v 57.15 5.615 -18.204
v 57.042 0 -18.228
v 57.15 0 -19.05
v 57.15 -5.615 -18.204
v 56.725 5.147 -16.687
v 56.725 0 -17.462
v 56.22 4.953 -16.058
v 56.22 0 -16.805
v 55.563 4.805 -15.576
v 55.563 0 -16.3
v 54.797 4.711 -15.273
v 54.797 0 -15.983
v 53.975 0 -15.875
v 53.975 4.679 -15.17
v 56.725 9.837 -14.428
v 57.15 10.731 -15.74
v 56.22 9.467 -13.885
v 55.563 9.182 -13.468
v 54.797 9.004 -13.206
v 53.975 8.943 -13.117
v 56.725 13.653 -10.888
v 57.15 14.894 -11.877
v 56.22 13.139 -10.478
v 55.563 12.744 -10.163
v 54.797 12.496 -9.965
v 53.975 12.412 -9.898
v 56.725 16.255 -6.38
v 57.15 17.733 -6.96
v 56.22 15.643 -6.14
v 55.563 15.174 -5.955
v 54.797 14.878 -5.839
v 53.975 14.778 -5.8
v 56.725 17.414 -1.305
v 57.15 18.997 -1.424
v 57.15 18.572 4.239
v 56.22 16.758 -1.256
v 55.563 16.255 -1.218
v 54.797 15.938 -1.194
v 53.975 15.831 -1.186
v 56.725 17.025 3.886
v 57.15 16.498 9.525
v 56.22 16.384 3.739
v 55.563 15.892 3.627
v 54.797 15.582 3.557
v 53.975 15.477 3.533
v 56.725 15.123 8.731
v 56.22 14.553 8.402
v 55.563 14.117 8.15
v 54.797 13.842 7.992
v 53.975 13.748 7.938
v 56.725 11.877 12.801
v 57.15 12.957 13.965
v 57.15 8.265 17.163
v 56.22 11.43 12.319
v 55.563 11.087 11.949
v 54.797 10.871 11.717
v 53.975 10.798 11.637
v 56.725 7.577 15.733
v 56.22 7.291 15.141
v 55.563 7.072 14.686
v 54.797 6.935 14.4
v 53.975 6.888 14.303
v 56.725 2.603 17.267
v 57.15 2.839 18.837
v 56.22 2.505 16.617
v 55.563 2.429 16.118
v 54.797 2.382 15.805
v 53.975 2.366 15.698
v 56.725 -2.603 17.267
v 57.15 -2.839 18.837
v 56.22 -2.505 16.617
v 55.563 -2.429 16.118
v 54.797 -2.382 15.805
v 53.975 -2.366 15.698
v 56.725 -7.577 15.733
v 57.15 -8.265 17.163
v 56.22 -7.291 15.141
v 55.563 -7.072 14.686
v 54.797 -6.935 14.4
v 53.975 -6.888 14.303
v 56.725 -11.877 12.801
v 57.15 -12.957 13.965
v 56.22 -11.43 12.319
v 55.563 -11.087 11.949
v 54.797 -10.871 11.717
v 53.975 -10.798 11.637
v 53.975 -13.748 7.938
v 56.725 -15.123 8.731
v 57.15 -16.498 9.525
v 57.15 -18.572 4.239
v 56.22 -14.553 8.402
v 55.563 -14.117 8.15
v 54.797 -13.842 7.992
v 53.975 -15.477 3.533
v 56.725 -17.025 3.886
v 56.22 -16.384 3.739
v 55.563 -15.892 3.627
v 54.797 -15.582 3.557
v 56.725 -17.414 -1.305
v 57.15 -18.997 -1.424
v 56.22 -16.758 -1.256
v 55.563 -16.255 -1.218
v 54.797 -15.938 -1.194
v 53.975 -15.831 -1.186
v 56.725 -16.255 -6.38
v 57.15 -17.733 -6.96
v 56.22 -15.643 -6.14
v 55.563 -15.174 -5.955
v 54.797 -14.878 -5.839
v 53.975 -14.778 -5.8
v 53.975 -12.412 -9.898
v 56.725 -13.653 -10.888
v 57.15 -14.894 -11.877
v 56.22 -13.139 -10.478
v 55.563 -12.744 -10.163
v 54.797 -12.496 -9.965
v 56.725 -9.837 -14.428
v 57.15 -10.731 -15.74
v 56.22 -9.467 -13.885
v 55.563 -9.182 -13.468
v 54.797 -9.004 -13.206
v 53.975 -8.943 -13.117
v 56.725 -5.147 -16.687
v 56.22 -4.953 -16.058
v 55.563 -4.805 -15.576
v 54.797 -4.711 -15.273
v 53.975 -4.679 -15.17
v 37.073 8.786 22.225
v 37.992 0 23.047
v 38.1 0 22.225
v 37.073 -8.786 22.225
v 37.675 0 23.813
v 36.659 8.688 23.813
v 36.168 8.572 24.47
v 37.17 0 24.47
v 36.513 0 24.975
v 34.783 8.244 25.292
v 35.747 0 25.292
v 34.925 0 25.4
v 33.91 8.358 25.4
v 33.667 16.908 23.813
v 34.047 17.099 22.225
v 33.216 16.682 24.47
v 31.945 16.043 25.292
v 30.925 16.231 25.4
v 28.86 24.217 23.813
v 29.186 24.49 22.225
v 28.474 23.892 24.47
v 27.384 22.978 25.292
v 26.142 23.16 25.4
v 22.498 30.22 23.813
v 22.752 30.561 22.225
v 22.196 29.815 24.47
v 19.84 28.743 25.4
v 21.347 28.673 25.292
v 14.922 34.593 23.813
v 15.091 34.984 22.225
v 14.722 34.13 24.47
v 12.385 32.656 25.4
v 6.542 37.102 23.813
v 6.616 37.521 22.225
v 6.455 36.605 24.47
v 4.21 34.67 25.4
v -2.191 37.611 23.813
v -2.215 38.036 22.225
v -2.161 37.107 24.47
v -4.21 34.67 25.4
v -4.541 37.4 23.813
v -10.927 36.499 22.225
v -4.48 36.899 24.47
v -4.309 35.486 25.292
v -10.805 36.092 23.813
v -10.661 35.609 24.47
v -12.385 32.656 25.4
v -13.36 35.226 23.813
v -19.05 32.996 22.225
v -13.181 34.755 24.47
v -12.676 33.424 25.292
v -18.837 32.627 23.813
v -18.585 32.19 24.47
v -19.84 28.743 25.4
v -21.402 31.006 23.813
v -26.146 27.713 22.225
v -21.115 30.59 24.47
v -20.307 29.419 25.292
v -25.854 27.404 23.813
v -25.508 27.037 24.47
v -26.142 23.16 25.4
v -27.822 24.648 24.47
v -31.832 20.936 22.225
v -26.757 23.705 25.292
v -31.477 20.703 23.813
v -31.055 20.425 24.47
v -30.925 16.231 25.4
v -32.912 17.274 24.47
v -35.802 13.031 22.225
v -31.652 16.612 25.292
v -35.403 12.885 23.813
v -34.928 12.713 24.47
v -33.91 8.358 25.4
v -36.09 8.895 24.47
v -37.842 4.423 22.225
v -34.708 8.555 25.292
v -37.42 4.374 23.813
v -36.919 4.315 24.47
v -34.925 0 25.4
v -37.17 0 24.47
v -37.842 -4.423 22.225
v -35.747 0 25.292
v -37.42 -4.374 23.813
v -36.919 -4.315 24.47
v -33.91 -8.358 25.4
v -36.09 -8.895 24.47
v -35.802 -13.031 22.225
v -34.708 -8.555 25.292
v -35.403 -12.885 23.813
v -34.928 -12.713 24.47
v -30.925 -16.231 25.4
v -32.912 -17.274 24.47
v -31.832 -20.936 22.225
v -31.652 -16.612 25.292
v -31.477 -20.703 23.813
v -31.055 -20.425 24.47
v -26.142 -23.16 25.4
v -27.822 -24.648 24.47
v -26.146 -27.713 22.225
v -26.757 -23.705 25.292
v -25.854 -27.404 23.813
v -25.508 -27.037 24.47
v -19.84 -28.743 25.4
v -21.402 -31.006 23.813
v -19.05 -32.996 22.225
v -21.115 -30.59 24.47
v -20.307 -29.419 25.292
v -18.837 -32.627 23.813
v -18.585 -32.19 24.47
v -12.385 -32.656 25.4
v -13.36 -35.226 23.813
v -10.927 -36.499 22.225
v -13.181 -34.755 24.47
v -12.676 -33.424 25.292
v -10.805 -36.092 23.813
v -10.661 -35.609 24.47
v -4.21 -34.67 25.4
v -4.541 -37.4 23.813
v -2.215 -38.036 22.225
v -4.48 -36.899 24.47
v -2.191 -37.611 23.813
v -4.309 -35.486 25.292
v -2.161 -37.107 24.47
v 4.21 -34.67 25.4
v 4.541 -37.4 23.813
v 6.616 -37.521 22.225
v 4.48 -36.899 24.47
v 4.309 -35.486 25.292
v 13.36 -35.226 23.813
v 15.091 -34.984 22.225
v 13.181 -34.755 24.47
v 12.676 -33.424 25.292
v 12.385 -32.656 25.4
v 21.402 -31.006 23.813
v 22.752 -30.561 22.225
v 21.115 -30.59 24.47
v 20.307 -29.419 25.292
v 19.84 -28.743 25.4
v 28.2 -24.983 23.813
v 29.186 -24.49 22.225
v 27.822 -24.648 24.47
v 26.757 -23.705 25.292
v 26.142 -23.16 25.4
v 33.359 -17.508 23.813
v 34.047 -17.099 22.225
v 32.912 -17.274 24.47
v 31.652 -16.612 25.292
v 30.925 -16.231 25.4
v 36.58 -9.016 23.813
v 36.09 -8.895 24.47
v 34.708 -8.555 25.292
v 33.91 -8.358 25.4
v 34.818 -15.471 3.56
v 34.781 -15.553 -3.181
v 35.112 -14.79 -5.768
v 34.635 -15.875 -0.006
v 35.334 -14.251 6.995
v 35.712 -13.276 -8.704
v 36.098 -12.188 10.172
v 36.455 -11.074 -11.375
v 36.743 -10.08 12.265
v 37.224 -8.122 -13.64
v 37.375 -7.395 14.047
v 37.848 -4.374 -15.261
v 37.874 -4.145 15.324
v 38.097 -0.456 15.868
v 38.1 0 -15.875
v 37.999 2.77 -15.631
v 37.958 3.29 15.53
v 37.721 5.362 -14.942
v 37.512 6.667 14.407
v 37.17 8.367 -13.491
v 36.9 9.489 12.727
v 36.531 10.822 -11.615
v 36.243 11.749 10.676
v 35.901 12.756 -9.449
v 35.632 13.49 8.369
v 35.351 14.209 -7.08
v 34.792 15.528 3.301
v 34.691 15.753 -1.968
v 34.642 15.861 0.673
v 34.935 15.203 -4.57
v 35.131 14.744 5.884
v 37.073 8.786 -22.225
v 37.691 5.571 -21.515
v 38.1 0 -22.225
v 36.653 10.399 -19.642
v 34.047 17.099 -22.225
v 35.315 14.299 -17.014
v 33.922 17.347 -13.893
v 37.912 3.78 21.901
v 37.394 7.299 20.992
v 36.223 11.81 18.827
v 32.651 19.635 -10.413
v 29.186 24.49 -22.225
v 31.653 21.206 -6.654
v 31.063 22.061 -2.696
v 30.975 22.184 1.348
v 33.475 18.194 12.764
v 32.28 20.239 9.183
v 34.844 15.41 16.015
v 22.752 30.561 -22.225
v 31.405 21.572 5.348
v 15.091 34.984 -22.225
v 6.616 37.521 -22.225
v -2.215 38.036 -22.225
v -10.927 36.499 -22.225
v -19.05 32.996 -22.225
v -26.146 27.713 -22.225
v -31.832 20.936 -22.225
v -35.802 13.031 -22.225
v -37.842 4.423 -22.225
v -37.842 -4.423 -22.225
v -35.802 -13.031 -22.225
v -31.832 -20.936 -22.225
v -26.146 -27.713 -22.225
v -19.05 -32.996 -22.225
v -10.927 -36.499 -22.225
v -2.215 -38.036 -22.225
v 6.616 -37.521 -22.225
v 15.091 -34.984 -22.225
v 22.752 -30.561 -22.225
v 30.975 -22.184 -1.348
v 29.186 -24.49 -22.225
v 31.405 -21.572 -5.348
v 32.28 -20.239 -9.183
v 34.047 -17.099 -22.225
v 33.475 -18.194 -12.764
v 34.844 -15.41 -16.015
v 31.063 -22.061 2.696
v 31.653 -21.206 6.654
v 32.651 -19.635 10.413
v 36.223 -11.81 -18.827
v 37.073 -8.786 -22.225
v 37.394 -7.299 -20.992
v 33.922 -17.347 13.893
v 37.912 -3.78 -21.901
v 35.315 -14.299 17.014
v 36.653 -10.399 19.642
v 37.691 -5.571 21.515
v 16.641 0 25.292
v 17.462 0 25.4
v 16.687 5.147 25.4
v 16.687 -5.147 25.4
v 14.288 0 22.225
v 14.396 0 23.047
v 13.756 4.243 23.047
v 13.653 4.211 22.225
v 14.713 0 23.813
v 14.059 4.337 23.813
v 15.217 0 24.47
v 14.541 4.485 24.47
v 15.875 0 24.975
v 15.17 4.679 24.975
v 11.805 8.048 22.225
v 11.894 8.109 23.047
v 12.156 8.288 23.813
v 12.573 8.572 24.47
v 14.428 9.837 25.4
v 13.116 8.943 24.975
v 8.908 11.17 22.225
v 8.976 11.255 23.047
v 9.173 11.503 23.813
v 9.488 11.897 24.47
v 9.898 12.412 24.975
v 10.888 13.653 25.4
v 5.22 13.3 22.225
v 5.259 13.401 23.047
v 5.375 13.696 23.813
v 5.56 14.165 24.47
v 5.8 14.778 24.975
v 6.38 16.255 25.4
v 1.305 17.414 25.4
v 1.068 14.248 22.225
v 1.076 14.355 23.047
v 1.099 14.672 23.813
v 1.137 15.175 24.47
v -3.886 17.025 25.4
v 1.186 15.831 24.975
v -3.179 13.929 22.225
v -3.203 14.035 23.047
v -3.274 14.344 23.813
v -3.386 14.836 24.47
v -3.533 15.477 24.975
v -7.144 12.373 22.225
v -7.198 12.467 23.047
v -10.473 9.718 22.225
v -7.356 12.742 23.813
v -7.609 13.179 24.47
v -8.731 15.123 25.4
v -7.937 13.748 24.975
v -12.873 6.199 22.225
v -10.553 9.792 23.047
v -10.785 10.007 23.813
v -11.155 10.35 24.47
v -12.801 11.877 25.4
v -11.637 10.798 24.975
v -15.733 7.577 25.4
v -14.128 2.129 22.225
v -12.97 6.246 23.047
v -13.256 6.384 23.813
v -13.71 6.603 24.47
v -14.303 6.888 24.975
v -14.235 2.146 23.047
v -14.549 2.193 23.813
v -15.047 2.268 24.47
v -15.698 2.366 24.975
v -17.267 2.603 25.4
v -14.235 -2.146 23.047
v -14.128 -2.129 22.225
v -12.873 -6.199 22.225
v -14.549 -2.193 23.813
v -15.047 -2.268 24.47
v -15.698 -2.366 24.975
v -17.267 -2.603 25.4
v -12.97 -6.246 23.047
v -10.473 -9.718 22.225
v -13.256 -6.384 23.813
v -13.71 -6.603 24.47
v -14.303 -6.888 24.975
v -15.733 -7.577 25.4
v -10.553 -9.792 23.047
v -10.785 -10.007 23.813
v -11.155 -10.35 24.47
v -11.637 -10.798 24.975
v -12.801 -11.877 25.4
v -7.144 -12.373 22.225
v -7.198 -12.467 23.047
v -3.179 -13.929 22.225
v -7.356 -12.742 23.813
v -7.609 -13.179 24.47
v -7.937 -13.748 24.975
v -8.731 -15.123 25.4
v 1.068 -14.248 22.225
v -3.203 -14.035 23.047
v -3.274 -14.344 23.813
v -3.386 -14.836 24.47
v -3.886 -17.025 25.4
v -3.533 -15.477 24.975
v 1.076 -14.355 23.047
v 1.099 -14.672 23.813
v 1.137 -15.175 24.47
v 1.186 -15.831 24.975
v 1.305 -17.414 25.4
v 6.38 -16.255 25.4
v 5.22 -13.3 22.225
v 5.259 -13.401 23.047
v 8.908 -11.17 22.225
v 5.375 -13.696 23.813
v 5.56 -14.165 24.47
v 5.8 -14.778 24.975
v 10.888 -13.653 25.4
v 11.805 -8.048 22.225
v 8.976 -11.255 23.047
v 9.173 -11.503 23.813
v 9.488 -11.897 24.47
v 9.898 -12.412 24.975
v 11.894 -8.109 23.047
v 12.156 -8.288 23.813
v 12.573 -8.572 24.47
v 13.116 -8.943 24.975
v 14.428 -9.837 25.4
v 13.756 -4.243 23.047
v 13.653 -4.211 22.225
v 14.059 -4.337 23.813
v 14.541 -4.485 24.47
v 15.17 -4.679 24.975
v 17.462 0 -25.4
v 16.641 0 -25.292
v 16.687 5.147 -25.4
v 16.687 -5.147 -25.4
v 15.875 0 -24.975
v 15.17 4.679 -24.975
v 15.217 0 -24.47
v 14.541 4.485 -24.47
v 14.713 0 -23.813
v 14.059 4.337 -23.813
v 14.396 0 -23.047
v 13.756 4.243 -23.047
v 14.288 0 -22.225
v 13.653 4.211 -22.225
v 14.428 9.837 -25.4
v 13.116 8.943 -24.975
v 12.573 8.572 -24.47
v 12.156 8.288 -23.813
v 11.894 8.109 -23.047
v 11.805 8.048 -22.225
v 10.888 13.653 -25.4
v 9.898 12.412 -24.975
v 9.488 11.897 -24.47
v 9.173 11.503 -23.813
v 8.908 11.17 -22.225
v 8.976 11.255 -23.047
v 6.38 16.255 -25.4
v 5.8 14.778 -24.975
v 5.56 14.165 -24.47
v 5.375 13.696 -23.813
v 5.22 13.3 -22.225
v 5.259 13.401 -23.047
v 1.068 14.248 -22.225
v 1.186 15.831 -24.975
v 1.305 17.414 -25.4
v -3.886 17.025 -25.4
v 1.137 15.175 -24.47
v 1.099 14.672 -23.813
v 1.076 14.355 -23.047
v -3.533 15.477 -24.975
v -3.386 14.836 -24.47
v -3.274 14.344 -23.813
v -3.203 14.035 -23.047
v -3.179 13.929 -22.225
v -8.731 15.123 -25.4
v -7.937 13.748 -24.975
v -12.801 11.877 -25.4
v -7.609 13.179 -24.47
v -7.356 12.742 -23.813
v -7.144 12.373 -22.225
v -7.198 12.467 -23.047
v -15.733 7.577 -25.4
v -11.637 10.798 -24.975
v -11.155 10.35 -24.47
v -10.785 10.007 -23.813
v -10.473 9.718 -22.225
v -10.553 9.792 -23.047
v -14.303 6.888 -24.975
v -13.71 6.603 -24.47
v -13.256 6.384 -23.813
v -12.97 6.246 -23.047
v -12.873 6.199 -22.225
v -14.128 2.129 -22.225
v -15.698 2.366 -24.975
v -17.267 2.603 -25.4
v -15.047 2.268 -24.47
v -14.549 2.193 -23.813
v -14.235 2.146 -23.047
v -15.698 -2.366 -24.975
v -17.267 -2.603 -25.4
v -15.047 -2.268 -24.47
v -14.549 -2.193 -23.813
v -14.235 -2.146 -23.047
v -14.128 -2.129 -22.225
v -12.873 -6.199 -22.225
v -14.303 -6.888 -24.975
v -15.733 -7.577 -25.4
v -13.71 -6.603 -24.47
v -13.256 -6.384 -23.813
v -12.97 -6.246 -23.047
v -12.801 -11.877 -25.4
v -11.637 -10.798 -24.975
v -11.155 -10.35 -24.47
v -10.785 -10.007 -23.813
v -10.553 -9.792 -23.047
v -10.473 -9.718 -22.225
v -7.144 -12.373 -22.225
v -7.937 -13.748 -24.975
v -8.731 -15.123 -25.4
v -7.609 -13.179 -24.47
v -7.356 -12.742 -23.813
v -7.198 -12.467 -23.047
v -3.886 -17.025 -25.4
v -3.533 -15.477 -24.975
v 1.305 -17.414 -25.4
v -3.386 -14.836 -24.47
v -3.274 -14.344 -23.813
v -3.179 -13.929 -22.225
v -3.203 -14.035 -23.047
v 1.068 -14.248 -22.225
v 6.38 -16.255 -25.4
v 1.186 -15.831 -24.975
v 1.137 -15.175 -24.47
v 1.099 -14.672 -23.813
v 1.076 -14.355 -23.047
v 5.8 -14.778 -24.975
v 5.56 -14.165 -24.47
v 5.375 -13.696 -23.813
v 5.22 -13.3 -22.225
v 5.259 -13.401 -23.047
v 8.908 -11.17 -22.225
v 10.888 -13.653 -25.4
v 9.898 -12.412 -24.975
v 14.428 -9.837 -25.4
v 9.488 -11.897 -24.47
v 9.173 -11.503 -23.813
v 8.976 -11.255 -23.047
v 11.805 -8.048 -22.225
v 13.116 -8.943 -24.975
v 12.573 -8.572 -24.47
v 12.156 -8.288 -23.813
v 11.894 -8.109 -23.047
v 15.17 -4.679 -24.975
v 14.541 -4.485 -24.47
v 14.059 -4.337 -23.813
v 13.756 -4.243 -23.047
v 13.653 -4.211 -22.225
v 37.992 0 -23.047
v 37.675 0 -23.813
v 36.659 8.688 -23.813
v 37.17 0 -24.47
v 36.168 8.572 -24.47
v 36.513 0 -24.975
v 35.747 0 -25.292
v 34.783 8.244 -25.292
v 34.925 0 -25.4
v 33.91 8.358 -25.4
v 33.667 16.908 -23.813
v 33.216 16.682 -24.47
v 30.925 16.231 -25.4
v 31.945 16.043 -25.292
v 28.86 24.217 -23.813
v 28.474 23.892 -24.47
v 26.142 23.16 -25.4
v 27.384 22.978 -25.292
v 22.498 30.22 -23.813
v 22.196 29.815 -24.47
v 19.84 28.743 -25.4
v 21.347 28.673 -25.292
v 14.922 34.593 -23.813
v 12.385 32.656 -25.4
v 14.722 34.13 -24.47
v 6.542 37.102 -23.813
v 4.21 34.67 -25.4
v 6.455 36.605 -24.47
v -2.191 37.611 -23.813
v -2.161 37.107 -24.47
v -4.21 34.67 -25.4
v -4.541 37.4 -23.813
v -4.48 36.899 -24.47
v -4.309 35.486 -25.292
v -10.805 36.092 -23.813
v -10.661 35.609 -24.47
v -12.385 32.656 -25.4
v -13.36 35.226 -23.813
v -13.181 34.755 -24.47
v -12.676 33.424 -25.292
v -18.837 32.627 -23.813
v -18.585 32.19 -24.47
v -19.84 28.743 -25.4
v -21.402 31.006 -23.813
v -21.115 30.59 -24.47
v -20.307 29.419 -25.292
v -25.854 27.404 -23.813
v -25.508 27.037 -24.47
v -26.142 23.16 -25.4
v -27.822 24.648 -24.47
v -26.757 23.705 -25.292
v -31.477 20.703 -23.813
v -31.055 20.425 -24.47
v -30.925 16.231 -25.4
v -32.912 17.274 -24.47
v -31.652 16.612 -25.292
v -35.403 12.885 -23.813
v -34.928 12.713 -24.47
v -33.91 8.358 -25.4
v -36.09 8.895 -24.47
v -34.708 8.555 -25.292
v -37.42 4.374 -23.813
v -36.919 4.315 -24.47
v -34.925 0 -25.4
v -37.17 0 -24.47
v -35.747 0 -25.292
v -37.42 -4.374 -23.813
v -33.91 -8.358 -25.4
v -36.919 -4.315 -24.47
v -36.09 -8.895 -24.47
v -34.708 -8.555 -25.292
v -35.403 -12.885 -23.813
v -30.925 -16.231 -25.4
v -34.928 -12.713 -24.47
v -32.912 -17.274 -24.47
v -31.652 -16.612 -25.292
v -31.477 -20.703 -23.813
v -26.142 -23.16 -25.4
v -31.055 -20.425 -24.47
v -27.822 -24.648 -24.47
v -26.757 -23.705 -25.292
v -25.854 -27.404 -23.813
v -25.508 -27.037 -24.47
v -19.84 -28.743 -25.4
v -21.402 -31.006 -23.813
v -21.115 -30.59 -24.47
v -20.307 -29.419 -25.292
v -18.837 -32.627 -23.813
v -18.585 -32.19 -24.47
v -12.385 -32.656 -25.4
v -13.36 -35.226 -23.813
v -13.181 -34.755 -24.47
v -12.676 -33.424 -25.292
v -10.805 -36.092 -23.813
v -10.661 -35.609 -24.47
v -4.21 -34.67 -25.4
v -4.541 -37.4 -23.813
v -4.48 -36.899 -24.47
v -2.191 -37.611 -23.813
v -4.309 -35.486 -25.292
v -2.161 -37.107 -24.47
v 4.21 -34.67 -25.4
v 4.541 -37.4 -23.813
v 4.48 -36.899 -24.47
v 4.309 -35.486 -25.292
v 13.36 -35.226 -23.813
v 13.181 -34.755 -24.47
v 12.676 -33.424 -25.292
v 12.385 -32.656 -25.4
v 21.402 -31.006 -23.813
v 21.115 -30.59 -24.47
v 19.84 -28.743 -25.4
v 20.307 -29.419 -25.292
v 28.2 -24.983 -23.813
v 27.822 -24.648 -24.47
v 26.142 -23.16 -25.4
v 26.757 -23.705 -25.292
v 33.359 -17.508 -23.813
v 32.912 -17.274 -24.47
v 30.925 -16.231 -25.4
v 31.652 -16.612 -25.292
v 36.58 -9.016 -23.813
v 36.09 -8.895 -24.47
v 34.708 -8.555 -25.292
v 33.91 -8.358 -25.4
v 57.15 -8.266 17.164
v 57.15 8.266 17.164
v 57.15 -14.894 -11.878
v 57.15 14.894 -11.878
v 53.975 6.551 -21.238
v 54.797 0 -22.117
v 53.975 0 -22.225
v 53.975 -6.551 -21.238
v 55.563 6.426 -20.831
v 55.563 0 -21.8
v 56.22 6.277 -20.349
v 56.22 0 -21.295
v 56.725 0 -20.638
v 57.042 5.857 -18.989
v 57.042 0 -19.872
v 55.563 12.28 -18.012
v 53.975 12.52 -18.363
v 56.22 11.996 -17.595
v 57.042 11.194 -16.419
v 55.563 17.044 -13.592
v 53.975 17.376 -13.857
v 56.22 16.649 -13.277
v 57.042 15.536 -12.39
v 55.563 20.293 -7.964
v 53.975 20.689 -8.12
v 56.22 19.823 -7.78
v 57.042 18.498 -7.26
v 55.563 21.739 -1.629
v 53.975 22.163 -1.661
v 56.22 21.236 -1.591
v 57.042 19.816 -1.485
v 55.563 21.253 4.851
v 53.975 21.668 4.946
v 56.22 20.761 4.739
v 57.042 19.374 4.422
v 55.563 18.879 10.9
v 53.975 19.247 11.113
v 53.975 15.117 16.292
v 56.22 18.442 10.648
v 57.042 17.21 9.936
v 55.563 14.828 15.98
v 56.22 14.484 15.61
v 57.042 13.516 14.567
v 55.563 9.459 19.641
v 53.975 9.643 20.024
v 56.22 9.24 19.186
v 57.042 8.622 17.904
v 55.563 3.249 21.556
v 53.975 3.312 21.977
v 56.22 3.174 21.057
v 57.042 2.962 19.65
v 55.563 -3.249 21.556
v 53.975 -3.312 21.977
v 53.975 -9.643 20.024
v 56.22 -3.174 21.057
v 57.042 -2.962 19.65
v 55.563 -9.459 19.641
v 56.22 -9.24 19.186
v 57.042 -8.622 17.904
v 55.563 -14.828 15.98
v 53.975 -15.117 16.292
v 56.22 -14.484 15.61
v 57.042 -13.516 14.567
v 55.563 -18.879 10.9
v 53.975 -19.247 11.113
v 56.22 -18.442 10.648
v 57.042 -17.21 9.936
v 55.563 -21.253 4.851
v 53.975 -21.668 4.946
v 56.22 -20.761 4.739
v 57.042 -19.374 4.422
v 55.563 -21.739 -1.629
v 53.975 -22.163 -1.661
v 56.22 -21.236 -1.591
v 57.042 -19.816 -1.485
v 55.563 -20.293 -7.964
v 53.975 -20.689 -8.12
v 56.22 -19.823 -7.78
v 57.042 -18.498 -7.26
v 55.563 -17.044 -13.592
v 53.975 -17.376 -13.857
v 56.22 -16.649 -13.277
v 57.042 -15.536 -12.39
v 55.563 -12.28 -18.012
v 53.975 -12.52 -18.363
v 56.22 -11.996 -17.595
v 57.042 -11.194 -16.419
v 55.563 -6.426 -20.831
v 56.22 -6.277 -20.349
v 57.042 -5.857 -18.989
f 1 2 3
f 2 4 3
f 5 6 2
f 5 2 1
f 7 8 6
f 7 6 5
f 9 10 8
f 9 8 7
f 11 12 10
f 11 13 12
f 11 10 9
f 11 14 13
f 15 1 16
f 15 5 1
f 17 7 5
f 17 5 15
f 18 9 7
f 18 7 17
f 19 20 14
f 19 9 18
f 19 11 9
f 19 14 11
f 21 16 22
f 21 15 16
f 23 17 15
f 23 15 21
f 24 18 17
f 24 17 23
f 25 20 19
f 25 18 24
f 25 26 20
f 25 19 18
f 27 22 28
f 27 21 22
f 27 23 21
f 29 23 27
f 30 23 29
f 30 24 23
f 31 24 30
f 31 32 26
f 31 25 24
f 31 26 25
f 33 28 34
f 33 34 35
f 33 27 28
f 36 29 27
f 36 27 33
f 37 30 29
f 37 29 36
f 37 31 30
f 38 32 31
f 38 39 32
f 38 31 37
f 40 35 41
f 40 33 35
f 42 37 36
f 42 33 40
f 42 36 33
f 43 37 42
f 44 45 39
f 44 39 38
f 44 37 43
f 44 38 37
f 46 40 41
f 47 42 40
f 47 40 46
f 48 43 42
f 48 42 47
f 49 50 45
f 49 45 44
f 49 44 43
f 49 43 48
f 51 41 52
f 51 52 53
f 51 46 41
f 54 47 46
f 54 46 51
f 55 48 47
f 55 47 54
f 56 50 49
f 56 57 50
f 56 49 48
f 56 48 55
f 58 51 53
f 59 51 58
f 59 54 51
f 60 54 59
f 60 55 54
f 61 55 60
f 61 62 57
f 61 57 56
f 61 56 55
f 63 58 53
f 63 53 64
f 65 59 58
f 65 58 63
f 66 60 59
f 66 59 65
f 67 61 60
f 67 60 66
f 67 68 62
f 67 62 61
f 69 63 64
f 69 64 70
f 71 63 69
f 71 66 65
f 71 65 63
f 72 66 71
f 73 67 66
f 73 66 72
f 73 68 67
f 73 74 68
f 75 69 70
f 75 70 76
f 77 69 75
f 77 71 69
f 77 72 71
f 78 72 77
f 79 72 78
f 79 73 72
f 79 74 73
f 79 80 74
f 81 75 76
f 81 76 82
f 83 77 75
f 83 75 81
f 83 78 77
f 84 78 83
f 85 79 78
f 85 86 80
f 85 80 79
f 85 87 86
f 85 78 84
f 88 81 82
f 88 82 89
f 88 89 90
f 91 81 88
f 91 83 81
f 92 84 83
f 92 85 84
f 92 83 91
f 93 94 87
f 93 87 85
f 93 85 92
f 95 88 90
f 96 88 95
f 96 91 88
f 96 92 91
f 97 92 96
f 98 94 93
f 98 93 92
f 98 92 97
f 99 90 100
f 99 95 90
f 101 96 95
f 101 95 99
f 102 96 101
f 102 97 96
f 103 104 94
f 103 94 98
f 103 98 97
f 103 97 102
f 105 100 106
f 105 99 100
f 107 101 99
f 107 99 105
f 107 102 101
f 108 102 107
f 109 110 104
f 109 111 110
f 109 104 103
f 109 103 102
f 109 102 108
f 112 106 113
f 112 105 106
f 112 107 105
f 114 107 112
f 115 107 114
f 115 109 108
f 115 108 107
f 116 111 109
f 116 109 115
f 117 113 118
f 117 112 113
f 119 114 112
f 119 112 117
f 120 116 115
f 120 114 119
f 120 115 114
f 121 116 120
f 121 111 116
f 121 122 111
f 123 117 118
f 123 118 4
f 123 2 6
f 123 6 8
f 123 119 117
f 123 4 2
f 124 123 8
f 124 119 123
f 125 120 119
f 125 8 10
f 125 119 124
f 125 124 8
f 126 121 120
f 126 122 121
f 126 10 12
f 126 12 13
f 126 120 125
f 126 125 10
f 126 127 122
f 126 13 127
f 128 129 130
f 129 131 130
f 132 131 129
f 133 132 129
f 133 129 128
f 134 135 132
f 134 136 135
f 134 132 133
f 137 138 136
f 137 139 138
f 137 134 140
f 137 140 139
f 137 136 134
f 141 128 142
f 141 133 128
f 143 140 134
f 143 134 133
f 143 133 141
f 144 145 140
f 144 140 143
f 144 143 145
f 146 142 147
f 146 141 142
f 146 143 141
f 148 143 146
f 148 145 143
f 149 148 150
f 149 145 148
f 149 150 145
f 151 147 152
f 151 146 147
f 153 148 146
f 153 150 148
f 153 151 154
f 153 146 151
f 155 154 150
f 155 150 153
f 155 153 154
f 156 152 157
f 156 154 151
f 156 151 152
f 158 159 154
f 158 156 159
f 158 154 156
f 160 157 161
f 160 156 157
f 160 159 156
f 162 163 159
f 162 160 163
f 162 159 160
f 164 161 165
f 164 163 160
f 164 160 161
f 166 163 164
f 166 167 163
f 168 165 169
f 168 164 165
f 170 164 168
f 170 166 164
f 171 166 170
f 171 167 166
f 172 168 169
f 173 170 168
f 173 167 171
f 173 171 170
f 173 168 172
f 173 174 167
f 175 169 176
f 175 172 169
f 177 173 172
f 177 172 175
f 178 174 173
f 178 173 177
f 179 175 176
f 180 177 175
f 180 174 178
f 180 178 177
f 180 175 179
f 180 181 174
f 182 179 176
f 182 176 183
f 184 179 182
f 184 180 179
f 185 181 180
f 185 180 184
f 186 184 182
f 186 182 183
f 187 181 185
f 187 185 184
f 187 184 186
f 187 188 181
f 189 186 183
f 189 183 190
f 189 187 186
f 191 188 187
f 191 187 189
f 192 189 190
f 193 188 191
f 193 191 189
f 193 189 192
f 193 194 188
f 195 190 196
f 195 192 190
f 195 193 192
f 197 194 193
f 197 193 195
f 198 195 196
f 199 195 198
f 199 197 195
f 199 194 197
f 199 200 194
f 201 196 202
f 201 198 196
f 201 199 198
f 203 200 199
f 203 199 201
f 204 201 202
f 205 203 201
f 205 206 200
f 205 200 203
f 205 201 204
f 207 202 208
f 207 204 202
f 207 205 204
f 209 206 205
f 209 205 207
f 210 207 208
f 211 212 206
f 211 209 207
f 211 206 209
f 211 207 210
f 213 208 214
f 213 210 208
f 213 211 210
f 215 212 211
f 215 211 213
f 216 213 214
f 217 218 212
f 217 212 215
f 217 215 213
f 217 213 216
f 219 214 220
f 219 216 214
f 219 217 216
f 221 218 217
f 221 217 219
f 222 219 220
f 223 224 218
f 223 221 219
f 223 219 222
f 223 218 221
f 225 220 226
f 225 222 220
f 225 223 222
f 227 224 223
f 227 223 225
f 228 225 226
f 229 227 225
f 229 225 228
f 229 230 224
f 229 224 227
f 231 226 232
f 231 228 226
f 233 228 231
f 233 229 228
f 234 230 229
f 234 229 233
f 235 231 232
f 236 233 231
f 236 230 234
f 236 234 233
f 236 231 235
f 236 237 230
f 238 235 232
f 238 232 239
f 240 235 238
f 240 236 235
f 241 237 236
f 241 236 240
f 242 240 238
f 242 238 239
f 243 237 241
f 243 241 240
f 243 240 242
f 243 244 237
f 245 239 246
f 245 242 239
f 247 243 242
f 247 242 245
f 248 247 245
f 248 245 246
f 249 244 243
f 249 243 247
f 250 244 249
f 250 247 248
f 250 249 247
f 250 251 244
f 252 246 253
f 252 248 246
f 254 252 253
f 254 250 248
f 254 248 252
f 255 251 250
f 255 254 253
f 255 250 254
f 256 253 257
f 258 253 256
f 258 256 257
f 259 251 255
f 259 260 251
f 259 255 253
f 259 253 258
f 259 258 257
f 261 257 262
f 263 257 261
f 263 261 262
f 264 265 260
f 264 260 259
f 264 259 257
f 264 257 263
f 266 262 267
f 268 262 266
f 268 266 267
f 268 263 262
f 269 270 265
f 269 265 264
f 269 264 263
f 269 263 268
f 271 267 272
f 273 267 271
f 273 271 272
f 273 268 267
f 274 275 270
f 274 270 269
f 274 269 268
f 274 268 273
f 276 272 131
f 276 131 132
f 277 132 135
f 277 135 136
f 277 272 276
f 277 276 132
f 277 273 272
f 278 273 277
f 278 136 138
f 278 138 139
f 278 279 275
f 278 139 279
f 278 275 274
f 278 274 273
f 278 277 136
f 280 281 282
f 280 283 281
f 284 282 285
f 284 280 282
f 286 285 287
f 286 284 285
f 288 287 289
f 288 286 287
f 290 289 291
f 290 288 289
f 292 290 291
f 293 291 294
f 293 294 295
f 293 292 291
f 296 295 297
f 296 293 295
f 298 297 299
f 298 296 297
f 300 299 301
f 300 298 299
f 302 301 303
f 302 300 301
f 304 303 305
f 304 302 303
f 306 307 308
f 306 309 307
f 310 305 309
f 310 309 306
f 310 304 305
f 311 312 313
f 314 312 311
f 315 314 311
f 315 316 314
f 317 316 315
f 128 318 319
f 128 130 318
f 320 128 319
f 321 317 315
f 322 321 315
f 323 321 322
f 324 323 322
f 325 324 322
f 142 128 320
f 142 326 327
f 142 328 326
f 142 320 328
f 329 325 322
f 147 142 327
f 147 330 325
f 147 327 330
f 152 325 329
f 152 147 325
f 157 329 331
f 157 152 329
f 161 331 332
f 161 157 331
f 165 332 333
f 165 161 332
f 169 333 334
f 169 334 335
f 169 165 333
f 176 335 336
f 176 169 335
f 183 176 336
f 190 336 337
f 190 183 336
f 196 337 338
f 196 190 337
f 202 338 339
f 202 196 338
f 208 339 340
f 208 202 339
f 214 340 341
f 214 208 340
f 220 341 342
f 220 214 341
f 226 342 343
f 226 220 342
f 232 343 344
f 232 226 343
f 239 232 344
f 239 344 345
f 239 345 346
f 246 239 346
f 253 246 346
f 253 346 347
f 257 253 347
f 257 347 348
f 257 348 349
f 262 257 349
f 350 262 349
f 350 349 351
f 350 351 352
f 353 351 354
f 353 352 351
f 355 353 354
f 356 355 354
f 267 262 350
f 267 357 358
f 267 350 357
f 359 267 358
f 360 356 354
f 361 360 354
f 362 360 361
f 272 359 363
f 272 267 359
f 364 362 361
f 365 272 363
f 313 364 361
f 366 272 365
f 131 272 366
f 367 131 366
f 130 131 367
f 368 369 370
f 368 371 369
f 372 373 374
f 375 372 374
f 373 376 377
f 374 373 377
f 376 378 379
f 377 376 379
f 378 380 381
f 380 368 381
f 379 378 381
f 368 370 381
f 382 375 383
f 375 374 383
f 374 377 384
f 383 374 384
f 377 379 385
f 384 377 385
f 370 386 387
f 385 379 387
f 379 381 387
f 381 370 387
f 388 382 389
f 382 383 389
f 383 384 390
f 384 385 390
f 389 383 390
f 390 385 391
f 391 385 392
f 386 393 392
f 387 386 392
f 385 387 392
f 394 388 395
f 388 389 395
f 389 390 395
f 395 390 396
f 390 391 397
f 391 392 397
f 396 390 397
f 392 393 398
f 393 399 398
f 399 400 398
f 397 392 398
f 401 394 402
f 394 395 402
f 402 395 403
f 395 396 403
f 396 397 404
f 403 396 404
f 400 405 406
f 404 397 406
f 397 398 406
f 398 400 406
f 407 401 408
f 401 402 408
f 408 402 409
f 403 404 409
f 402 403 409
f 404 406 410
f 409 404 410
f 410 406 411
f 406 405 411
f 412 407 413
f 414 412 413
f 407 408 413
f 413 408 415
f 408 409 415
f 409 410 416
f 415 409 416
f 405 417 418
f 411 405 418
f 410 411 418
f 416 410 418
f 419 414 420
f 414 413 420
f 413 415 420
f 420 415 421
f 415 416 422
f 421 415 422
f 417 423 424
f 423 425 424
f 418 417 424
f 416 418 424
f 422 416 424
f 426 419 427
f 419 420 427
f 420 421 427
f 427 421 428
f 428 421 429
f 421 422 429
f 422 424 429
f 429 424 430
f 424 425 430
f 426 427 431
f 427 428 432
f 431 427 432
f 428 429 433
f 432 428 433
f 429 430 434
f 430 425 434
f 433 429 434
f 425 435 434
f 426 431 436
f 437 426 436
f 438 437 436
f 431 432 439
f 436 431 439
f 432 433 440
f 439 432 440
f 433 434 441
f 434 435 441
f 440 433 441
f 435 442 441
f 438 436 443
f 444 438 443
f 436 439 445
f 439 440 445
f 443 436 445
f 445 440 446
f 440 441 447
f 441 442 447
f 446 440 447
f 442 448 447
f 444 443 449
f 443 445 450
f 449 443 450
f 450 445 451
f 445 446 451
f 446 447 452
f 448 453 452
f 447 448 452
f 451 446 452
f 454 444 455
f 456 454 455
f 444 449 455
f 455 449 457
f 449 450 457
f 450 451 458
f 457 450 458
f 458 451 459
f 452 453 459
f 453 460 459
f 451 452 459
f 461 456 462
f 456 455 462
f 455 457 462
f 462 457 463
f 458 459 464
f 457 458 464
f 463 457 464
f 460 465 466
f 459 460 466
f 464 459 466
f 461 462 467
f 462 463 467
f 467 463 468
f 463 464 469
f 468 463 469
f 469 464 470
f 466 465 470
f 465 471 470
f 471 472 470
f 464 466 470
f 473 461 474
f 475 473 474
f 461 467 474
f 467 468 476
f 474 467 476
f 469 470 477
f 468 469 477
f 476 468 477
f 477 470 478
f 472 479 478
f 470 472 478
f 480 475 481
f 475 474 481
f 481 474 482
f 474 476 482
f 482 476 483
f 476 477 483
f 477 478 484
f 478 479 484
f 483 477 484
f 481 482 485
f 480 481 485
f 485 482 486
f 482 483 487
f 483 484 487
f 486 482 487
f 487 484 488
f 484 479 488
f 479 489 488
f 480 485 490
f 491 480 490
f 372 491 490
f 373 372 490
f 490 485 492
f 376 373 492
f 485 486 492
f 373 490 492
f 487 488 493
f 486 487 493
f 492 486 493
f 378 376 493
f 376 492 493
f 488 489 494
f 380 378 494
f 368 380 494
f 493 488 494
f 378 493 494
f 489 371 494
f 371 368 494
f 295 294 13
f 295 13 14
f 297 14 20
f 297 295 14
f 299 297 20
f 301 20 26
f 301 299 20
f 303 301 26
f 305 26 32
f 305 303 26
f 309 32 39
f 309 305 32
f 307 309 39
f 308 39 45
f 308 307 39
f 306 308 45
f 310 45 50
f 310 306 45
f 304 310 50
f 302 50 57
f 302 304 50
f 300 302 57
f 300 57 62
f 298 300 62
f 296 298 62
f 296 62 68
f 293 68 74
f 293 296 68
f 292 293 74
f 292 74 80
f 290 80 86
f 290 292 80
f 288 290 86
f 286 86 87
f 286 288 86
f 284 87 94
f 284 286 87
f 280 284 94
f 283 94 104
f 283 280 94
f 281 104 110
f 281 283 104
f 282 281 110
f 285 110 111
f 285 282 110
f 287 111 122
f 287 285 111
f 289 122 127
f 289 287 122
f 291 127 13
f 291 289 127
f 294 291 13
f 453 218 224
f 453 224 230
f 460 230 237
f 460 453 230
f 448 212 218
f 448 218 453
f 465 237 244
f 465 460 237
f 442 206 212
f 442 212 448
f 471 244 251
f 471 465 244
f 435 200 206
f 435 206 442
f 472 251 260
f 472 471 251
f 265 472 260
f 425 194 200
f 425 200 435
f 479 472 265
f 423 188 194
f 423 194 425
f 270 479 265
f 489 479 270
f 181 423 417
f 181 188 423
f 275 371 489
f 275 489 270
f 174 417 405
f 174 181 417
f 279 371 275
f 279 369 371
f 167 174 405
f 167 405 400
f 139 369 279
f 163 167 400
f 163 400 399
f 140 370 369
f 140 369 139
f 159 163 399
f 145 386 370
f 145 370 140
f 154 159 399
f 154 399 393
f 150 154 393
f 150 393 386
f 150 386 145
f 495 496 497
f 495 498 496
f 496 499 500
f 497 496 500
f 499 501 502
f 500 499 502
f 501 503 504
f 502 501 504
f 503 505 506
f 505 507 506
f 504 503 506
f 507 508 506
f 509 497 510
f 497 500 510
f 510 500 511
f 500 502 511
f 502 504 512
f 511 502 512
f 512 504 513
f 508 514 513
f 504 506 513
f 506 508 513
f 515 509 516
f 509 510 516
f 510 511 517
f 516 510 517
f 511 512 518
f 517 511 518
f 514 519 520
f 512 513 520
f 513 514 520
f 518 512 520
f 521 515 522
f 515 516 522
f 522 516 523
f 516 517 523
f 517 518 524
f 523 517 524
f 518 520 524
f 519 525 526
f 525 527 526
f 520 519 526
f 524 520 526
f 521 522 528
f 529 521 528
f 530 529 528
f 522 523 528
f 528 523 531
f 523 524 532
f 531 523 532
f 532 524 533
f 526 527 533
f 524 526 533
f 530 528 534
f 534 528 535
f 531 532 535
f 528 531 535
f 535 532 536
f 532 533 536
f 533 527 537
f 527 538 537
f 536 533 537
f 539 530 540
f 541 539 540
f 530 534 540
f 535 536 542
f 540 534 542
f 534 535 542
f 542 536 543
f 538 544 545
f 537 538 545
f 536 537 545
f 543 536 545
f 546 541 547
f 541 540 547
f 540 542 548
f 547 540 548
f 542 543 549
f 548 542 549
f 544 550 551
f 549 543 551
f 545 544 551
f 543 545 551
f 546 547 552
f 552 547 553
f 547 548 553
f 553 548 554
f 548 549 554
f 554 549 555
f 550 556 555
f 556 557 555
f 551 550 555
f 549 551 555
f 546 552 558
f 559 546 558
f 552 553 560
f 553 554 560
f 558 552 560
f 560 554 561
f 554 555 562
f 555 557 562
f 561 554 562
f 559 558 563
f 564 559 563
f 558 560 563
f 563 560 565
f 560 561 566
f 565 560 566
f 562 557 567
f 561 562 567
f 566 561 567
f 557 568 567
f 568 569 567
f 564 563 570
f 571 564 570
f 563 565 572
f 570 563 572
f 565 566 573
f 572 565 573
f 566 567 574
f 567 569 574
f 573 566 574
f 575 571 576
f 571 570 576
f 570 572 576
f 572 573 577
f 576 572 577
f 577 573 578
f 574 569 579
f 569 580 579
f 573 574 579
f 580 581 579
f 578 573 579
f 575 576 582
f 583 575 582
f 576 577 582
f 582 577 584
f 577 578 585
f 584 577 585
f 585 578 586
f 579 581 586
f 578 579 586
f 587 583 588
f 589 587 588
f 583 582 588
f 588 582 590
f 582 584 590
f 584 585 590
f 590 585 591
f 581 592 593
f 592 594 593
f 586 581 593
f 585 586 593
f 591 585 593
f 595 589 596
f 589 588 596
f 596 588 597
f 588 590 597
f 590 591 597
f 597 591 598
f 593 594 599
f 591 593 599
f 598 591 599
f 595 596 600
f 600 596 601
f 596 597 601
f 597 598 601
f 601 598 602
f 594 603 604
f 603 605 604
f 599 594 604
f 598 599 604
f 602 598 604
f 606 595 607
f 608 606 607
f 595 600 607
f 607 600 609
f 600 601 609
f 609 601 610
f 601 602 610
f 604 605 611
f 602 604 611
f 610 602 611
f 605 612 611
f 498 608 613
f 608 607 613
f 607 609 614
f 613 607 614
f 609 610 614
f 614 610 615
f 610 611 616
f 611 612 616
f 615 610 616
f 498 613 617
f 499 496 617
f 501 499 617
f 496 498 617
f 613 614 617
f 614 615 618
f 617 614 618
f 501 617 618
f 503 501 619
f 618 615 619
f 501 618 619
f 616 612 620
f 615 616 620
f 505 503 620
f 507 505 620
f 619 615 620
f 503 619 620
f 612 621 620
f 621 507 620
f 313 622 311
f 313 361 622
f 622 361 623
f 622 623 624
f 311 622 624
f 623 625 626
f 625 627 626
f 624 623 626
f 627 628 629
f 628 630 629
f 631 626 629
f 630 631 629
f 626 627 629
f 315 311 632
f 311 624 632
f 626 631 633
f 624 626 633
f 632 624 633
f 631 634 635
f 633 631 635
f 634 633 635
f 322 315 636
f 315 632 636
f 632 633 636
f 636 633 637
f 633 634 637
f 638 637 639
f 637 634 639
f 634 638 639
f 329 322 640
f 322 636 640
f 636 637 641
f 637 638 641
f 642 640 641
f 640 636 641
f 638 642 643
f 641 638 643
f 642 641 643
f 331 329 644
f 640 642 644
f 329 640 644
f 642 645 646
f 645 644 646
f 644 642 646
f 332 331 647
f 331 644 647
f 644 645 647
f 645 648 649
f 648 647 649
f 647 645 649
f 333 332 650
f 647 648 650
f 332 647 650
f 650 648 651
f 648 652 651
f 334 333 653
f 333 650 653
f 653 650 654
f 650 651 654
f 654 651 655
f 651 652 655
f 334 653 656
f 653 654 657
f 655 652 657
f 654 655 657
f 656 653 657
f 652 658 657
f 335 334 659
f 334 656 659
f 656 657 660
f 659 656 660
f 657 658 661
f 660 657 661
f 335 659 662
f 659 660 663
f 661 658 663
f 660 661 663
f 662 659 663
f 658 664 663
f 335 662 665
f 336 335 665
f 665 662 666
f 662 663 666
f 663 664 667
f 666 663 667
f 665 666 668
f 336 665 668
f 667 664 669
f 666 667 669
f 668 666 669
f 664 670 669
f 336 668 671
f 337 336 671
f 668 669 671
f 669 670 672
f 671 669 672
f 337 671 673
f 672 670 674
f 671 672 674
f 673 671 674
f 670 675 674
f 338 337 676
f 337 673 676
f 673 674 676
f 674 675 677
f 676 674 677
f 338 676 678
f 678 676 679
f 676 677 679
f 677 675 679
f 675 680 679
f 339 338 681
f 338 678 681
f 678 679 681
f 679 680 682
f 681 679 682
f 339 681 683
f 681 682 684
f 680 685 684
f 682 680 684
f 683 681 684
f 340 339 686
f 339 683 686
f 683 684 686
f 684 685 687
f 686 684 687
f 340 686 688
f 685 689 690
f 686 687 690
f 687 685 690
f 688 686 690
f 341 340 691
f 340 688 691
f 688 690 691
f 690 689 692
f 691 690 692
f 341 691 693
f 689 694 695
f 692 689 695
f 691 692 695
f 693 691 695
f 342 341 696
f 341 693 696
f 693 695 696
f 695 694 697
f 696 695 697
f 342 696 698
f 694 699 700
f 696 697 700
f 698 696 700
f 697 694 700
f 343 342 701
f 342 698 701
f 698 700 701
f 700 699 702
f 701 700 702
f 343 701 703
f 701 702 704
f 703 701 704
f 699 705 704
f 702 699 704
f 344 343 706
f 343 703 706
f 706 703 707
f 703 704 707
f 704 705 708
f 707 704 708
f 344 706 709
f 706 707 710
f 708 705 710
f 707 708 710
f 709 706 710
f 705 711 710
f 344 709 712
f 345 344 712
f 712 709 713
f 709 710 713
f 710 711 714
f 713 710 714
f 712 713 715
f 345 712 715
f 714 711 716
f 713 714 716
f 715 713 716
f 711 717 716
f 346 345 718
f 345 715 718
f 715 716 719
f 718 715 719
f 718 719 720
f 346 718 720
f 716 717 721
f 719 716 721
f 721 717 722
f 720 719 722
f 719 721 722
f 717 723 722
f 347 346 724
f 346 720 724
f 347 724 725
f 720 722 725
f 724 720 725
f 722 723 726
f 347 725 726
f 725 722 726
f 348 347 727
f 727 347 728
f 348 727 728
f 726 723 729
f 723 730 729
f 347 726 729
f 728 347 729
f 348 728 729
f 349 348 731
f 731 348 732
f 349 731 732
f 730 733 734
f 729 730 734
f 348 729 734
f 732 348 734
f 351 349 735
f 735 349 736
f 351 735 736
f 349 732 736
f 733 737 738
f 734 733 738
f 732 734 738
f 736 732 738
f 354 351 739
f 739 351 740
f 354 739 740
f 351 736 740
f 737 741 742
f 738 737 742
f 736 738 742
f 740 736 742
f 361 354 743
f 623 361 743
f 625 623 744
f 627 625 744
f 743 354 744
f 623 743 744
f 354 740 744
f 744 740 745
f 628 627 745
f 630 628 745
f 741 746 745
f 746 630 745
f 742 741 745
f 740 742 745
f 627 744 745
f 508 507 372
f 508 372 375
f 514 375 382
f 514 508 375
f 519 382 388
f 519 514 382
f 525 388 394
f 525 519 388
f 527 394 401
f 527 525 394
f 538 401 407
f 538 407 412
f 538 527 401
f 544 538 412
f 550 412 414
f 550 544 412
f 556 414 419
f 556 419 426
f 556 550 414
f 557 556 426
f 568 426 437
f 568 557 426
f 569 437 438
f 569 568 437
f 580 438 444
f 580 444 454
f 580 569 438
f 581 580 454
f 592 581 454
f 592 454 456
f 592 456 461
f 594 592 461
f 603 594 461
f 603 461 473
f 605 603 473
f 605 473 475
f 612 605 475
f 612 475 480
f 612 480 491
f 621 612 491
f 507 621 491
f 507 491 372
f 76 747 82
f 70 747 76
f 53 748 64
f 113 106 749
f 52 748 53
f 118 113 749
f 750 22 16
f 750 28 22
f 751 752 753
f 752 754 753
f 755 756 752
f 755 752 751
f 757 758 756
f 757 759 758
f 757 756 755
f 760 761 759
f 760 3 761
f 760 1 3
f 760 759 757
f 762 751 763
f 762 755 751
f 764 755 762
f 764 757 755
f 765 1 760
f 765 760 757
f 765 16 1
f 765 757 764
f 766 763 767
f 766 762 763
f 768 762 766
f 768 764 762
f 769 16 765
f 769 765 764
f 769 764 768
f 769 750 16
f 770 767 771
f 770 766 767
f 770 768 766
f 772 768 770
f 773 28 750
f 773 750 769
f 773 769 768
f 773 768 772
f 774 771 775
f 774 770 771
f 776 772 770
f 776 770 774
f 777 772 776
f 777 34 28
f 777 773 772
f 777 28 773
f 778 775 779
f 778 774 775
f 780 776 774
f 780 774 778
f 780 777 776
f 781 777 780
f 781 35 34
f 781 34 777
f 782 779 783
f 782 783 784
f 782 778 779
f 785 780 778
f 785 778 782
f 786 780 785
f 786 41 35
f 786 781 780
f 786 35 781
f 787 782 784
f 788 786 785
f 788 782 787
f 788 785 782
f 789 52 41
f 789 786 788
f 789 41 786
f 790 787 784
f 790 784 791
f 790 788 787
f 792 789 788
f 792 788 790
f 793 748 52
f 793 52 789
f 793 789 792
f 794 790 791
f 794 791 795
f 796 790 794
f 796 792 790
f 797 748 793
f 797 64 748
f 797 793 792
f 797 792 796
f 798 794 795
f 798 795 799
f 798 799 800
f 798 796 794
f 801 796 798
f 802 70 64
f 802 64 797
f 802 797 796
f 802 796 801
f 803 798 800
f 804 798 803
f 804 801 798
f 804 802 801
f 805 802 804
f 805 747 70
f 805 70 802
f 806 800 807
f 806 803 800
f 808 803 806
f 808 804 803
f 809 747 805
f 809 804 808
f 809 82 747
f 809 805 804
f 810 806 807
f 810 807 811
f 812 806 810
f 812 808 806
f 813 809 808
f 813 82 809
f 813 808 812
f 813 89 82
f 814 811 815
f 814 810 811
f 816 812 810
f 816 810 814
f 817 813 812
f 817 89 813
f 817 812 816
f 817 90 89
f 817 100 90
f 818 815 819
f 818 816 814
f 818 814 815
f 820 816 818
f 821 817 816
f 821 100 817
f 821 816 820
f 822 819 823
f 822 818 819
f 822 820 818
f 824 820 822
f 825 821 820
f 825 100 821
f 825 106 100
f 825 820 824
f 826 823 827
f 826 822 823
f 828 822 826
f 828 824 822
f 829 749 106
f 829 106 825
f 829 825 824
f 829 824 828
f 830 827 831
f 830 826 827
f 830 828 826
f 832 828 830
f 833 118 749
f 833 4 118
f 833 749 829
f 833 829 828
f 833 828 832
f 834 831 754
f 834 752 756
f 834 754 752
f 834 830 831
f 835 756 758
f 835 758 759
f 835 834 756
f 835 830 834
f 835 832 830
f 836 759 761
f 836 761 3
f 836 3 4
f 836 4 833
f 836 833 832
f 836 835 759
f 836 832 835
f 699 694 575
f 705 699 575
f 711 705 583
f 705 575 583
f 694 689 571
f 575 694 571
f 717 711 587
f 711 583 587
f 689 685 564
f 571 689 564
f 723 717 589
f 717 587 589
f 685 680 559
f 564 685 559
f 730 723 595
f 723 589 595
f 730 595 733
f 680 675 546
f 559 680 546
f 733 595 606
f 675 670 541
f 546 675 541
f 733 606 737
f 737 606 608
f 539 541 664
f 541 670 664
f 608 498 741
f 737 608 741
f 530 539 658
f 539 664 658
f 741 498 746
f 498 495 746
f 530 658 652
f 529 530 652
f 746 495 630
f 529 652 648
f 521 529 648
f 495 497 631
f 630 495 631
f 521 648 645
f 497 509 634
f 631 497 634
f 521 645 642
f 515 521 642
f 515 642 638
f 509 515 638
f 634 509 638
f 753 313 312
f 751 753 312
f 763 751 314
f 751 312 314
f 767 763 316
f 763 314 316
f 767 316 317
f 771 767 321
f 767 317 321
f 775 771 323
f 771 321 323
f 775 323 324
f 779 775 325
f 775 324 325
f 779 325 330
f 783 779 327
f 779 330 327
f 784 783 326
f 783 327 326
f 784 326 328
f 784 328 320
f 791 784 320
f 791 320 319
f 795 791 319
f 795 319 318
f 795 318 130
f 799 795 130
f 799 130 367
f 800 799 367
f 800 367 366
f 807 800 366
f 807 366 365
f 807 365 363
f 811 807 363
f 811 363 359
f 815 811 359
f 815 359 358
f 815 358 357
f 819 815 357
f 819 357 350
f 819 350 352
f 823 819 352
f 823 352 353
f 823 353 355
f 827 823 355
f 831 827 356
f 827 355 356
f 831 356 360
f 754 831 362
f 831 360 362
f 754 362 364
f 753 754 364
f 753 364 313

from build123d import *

# Parameters (mm, degrees)
SKETCH1_R                = 38.1
SKETCH1_R_2              = 14.2875
BOSS_EXTRUDE1_DEPTH      = 25.4
BOSS_EXTRUDE2_DEPTH      = 25.4
BOSS_EXTRUDE2_DEPTH_BACK = 2.54
SKETCH2_R                = 22.225
SKETCH2_R_2              = 15.875
FILLET1_R                = 3.175


with BuildPart() as part:
    # Sketch1 → Boss-Extrude1 (new, symmetric)
    with BuildSketch(Plane.XY):
        Circle(SKETCH1_R)
        Circle(SKETCH1_R_2, mode=Mode.SUBTRACT)
    extrude(amount=BOSS_EXTRUDE1_DEPTH, both=True)

    # Sketch2 → Boss-Extrude2 (add, two sides: drawn at the far end of the back side and taken through both)
    with BuildSketch(Plane(origin=(31.75, 0, 0), x_dir=(0, 0, -1), z_dir=(1, 0, 0)).offset(-BOSS_EXTRUDE2_DEPTH_BACK)):
        Circle(SKETCH2_R)
        Circle(SKETCH2_R_2, mode=Mode.SUBTRACT)
    extrude(amount=BOSS_EXTRUDE2_DEPTH + BOSS_EXTRUDE2_DEPTH_BACK)

    # Fillet1
    fillet1_edges = [part.edges().sort_by_distance(p)[0] for p in [
        (57.15, 0, 15.875),
        (57.15, 0, 22.225),
        (-38.1, 0, -25.4),
        (-38.1, 0, 25.4),
        (-14.2875, 0, -25.4),
        (-14.2875, 0, 25.4),
    ]]
    fillet(fillet1_edges, radius=FILLET1_R - 0.0001)  # a hair under: the kernel refuses the full size


solid = part.part
